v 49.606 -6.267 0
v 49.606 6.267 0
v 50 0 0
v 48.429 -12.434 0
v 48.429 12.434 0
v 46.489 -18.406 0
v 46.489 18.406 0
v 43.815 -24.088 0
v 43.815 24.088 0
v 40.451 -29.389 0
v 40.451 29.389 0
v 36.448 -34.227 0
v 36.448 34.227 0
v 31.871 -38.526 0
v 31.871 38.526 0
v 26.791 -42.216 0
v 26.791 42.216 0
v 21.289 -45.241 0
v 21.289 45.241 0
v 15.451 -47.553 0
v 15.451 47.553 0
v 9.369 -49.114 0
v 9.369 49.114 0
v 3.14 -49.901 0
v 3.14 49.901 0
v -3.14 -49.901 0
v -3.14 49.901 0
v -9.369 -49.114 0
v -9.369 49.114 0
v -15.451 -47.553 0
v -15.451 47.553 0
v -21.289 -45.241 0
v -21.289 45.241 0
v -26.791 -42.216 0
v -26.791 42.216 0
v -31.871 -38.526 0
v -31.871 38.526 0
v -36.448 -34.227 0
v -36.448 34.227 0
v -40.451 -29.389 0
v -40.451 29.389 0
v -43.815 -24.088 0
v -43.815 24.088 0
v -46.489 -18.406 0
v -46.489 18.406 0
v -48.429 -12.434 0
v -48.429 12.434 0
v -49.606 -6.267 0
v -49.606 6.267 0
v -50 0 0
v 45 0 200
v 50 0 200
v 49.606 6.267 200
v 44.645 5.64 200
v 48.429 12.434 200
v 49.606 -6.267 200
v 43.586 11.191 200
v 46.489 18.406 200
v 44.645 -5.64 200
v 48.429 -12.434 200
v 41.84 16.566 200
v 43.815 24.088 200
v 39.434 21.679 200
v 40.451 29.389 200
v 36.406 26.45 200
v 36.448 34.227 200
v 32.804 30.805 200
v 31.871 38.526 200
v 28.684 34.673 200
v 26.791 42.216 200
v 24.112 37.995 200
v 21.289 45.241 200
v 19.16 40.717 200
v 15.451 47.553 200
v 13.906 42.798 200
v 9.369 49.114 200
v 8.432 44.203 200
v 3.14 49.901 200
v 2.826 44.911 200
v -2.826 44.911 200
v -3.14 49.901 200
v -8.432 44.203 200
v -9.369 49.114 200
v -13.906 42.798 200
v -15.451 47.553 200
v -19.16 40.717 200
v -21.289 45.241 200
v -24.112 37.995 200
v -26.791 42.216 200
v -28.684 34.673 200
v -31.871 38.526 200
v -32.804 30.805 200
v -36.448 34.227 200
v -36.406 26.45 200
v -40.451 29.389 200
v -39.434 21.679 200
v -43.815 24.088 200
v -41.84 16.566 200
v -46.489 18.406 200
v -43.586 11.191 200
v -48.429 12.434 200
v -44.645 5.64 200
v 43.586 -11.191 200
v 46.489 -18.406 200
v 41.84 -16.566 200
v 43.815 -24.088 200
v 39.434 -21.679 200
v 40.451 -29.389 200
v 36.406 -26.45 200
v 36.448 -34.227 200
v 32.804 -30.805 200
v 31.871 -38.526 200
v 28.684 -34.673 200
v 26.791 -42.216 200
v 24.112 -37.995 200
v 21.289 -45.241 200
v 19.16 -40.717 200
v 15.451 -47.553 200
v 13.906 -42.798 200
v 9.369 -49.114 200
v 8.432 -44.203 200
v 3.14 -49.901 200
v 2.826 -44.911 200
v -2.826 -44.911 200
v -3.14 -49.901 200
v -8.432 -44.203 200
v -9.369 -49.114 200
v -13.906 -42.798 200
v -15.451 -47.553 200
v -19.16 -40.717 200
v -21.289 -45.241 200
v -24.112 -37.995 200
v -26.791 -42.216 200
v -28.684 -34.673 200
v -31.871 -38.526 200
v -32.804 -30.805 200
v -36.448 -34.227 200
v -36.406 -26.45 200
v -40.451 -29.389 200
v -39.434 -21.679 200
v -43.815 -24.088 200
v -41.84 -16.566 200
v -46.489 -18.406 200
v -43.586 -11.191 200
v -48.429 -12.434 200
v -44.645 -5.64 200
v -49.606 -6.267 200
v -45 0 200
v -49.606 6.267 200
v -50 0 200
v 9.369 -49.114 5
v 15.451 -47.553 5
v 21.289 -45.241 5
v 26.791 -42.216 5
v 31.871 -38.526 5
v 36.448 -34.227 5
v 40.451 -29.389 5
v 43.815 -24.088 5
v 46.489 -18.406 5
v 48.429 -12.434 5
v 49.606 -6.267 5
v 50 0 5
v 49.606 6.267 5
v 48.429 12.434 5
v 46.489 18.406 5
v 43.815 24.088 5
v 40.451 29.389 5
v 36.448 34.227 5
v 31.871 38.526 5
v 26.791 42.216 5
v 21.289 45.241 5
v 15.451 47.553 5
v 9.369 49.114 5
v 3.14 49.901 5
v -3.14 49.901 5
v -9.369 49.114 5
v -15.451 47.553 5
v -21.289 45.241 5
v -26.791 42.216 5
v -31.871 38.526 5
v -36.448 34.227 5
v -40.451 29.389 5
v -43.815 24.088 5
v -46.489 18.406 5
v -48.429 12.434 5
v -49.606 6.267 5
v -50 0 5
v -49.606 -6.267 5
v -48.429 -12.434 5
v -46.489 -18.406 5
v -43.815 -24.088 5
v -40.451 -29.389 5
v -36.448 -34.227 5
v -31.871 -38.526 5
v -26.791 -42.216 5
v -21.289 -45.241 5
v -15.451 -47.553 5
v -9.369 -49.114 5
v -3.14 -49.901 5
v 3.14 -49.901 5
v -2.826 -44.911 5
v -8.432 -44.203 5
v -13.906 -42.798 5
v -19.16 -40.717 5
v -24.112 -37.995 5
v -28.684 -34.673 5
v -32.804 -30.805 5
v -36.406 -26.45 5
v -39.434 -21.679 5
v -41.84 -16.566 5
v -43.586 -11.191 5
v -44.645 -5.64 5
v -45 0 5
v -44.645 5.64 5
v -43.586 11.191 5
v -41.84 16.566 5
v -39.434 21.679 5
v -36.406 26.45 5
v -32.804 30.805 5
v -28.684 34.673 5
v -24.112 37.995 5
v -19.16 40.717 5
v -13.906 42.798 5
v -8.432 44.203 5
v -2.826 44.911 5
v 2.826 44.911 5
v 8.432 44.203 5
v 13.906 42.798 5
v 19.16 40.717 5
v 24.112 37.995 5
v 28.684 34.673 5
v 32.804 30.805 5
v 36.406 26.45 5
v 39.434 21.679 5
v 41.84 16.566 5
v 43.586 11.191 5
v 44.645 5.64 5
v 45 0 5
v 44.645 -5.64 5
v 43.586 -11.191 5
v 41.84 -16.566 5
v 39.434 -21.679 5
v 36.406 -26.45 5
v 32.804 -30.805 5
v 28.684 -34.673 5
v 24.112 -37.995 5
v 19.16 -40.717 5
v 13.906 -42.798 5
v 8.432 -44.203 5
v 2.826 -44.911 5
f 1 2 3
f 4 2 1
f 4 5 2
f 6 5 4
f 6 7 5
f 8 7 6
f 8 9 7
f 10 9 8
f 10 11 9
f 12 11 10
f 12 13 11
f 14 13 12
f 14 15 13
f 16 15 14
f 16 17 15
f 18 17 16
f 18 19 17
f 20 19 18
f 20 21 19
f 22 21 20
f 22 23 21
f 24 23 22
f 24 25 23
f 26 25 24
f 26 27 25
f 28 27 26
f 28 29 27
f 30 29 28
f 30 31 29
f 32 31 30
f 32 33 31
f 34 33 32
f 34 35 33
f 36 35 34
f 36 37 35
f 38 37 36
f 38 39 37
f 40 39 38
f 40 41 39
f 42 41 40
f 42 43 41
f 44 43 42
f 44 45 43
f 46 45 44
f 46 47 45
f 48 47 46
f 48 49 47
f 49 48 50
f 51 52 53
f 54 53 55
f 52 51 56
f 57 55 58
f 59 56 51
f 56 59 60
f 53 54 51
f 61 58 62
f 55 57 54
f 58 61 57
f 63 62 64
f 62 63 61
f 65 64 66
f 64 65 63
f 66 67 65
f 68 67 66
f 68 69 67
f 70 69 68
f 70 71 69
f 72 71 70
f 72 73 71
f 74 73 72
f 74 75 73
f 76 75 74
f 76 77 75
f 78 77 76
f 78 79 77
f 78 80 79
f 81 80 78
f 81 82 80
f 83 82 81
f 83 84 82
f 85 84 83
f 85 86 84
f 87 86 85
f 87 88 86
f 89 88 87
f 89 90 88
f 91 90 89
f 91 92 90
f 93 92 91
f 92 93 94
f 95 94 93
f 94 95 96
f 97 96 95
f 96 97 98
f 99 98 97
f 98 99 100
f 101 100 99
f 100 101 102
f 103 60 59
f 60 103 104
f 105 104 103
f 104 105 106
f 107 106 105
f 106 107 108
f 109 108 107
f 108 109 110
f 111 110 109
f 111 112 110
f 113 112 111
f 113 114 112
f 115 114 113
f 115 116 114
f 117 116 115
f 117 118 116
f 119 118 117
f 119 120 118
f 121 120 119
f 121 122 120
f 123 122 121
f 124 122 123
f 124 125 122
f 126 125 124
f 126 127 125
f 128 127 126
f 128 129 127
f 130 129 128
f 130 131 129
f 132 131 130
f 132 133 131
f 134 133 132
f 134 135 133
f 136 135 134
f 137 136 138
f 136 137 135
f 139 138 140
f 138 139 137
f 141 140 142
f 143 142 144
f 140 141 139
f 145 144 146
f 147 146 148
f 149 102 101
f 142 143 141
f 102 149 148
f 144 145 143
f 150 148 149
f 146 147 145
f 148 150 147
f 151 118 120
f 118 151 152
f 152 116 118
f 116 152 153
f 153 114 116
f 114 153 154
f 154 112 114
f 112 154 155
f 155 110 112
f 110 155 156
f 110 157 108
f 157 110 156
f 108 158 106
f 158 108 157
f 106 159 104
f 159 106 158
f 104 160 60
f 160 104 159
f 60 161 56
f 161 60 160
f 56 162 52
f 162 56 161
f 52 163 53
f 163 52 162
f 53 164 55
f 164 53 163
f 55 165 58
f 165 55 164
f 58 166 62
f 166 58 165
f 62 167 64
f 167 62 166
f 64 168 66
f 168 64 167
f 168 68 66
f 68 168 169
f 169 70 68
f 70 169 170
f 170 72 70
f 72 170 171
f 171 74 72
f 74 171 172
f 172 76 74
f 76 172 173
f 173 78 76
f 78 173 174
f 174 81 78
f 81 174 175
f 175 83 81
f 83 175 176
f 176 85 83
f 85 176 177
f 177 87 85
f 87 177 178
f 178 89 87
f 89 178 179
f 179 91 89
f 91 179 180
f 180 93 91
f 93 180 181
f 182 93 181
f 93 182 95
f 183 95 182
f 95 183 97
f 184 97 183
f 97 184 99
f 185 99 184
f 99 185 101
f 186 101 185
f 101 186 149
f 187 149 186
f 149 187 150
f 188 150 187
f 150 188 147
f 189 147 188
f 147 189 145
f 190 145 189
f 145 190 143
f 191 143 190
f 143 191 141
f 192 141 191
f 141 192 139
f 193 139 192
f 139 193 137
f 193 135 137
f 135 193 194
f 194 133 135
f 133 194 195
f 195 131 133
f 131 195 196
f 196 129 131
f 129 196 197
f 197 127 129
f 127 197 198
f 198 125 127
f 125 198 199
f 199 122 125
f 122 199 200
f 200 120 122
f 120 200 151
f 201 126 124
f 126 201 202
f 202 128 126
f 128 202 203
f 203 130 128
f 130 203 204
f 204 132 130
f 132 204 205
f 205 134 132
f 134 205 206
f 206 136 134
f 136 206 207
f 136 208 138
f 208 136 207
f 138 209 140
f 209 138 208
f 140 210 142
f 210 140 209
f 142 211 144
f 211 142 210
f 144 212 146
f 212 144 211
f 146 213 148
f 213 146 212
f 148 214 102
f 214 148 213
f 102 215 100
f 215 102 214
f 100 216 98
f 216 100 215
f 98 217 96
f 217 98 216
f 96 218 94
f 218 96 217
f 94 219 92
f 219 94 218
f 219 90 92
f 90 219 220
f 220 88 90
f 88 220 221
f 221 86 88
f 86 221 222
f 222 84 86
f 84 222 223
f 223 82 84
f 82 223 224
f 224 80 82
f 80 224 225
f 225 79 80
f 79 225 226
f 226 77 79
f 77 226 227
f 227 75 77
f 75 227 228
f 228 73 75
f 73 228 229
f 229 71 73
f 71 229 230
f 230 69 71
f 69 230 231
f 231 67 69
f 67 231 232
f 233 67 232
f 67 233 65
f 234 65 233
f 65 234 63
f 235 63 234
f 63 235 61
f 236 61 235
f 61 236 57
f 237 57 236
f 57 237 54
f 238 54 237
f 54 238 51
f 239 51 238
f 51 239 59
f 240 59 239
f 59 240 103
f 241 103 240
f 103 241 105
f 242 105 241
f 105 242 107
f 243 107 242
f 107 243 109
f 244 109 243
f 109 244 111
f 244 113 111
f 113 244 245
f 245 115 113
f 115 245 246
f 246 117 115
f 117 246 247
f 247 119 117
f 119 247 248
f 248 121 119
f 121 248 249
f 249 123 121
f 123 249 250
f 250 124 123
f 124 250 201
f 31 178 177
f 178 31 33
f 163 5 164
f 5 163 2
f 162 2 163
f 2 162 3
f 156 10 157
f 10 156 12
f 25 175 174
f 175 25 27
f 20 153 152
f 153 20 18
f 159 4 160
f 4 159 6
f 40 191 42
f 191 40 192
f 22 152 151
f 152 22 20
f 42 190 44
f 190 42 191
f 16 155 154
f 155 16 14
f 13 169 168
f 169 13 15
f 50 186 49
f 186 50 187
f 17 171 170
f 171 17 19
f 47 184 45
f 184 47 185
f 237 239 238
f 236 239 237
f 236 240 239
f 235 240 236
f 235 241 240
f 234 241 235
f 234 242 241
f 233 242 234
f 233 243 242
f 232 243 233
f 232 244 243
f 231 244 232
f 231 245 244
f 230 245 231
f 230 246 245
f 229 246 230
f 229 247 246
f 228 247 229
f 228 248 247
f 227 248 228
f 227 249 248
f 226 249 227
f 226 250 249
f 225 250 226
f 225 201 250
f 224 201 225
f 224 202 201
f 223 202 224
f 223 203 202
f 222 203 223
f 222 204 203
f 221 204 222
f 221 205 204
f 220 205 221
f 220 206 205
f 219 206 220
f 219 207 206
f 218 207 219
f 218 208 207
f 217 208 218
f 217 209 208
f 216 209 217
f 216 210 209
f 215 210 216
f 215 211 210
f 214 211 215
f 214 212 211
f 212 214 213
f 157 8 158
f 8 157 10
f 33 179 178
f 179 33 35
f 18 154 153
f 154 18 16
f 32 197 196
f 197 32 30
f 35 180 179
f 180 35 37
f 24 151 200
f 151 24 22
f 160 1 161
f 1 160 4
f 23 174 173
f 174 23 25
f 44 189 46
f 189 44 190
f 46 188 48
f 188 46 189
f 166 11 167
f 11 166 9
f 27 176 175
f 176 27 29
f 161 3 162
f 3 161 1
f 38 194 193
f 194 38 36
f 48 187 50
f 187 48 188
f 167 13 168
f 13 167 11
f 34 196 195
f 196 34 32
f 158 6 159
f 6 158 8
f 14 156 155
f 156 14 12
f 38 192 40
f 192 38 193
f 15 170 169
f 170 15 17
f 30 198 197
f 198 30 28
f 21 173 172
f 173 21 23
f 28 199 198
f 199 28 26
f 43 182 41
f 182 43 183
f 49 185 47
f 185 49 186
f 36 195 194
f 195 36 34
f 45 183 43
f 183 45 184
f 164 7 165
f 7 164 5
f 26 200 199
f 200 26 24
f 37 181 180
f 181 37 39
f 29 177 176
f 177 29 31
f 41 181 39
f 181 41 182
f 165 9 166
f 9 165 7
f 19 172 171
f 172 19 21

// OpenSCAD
$fn = 50;
thickness = 5;
radius = 50;

union() {
  linear_extrude(height=200) {
    difference() {
      circle(radius);
      circle(radius - thickness);
    }
  }
  linear_extrude(height=thickness) {
    circle(radius);
  }
}
